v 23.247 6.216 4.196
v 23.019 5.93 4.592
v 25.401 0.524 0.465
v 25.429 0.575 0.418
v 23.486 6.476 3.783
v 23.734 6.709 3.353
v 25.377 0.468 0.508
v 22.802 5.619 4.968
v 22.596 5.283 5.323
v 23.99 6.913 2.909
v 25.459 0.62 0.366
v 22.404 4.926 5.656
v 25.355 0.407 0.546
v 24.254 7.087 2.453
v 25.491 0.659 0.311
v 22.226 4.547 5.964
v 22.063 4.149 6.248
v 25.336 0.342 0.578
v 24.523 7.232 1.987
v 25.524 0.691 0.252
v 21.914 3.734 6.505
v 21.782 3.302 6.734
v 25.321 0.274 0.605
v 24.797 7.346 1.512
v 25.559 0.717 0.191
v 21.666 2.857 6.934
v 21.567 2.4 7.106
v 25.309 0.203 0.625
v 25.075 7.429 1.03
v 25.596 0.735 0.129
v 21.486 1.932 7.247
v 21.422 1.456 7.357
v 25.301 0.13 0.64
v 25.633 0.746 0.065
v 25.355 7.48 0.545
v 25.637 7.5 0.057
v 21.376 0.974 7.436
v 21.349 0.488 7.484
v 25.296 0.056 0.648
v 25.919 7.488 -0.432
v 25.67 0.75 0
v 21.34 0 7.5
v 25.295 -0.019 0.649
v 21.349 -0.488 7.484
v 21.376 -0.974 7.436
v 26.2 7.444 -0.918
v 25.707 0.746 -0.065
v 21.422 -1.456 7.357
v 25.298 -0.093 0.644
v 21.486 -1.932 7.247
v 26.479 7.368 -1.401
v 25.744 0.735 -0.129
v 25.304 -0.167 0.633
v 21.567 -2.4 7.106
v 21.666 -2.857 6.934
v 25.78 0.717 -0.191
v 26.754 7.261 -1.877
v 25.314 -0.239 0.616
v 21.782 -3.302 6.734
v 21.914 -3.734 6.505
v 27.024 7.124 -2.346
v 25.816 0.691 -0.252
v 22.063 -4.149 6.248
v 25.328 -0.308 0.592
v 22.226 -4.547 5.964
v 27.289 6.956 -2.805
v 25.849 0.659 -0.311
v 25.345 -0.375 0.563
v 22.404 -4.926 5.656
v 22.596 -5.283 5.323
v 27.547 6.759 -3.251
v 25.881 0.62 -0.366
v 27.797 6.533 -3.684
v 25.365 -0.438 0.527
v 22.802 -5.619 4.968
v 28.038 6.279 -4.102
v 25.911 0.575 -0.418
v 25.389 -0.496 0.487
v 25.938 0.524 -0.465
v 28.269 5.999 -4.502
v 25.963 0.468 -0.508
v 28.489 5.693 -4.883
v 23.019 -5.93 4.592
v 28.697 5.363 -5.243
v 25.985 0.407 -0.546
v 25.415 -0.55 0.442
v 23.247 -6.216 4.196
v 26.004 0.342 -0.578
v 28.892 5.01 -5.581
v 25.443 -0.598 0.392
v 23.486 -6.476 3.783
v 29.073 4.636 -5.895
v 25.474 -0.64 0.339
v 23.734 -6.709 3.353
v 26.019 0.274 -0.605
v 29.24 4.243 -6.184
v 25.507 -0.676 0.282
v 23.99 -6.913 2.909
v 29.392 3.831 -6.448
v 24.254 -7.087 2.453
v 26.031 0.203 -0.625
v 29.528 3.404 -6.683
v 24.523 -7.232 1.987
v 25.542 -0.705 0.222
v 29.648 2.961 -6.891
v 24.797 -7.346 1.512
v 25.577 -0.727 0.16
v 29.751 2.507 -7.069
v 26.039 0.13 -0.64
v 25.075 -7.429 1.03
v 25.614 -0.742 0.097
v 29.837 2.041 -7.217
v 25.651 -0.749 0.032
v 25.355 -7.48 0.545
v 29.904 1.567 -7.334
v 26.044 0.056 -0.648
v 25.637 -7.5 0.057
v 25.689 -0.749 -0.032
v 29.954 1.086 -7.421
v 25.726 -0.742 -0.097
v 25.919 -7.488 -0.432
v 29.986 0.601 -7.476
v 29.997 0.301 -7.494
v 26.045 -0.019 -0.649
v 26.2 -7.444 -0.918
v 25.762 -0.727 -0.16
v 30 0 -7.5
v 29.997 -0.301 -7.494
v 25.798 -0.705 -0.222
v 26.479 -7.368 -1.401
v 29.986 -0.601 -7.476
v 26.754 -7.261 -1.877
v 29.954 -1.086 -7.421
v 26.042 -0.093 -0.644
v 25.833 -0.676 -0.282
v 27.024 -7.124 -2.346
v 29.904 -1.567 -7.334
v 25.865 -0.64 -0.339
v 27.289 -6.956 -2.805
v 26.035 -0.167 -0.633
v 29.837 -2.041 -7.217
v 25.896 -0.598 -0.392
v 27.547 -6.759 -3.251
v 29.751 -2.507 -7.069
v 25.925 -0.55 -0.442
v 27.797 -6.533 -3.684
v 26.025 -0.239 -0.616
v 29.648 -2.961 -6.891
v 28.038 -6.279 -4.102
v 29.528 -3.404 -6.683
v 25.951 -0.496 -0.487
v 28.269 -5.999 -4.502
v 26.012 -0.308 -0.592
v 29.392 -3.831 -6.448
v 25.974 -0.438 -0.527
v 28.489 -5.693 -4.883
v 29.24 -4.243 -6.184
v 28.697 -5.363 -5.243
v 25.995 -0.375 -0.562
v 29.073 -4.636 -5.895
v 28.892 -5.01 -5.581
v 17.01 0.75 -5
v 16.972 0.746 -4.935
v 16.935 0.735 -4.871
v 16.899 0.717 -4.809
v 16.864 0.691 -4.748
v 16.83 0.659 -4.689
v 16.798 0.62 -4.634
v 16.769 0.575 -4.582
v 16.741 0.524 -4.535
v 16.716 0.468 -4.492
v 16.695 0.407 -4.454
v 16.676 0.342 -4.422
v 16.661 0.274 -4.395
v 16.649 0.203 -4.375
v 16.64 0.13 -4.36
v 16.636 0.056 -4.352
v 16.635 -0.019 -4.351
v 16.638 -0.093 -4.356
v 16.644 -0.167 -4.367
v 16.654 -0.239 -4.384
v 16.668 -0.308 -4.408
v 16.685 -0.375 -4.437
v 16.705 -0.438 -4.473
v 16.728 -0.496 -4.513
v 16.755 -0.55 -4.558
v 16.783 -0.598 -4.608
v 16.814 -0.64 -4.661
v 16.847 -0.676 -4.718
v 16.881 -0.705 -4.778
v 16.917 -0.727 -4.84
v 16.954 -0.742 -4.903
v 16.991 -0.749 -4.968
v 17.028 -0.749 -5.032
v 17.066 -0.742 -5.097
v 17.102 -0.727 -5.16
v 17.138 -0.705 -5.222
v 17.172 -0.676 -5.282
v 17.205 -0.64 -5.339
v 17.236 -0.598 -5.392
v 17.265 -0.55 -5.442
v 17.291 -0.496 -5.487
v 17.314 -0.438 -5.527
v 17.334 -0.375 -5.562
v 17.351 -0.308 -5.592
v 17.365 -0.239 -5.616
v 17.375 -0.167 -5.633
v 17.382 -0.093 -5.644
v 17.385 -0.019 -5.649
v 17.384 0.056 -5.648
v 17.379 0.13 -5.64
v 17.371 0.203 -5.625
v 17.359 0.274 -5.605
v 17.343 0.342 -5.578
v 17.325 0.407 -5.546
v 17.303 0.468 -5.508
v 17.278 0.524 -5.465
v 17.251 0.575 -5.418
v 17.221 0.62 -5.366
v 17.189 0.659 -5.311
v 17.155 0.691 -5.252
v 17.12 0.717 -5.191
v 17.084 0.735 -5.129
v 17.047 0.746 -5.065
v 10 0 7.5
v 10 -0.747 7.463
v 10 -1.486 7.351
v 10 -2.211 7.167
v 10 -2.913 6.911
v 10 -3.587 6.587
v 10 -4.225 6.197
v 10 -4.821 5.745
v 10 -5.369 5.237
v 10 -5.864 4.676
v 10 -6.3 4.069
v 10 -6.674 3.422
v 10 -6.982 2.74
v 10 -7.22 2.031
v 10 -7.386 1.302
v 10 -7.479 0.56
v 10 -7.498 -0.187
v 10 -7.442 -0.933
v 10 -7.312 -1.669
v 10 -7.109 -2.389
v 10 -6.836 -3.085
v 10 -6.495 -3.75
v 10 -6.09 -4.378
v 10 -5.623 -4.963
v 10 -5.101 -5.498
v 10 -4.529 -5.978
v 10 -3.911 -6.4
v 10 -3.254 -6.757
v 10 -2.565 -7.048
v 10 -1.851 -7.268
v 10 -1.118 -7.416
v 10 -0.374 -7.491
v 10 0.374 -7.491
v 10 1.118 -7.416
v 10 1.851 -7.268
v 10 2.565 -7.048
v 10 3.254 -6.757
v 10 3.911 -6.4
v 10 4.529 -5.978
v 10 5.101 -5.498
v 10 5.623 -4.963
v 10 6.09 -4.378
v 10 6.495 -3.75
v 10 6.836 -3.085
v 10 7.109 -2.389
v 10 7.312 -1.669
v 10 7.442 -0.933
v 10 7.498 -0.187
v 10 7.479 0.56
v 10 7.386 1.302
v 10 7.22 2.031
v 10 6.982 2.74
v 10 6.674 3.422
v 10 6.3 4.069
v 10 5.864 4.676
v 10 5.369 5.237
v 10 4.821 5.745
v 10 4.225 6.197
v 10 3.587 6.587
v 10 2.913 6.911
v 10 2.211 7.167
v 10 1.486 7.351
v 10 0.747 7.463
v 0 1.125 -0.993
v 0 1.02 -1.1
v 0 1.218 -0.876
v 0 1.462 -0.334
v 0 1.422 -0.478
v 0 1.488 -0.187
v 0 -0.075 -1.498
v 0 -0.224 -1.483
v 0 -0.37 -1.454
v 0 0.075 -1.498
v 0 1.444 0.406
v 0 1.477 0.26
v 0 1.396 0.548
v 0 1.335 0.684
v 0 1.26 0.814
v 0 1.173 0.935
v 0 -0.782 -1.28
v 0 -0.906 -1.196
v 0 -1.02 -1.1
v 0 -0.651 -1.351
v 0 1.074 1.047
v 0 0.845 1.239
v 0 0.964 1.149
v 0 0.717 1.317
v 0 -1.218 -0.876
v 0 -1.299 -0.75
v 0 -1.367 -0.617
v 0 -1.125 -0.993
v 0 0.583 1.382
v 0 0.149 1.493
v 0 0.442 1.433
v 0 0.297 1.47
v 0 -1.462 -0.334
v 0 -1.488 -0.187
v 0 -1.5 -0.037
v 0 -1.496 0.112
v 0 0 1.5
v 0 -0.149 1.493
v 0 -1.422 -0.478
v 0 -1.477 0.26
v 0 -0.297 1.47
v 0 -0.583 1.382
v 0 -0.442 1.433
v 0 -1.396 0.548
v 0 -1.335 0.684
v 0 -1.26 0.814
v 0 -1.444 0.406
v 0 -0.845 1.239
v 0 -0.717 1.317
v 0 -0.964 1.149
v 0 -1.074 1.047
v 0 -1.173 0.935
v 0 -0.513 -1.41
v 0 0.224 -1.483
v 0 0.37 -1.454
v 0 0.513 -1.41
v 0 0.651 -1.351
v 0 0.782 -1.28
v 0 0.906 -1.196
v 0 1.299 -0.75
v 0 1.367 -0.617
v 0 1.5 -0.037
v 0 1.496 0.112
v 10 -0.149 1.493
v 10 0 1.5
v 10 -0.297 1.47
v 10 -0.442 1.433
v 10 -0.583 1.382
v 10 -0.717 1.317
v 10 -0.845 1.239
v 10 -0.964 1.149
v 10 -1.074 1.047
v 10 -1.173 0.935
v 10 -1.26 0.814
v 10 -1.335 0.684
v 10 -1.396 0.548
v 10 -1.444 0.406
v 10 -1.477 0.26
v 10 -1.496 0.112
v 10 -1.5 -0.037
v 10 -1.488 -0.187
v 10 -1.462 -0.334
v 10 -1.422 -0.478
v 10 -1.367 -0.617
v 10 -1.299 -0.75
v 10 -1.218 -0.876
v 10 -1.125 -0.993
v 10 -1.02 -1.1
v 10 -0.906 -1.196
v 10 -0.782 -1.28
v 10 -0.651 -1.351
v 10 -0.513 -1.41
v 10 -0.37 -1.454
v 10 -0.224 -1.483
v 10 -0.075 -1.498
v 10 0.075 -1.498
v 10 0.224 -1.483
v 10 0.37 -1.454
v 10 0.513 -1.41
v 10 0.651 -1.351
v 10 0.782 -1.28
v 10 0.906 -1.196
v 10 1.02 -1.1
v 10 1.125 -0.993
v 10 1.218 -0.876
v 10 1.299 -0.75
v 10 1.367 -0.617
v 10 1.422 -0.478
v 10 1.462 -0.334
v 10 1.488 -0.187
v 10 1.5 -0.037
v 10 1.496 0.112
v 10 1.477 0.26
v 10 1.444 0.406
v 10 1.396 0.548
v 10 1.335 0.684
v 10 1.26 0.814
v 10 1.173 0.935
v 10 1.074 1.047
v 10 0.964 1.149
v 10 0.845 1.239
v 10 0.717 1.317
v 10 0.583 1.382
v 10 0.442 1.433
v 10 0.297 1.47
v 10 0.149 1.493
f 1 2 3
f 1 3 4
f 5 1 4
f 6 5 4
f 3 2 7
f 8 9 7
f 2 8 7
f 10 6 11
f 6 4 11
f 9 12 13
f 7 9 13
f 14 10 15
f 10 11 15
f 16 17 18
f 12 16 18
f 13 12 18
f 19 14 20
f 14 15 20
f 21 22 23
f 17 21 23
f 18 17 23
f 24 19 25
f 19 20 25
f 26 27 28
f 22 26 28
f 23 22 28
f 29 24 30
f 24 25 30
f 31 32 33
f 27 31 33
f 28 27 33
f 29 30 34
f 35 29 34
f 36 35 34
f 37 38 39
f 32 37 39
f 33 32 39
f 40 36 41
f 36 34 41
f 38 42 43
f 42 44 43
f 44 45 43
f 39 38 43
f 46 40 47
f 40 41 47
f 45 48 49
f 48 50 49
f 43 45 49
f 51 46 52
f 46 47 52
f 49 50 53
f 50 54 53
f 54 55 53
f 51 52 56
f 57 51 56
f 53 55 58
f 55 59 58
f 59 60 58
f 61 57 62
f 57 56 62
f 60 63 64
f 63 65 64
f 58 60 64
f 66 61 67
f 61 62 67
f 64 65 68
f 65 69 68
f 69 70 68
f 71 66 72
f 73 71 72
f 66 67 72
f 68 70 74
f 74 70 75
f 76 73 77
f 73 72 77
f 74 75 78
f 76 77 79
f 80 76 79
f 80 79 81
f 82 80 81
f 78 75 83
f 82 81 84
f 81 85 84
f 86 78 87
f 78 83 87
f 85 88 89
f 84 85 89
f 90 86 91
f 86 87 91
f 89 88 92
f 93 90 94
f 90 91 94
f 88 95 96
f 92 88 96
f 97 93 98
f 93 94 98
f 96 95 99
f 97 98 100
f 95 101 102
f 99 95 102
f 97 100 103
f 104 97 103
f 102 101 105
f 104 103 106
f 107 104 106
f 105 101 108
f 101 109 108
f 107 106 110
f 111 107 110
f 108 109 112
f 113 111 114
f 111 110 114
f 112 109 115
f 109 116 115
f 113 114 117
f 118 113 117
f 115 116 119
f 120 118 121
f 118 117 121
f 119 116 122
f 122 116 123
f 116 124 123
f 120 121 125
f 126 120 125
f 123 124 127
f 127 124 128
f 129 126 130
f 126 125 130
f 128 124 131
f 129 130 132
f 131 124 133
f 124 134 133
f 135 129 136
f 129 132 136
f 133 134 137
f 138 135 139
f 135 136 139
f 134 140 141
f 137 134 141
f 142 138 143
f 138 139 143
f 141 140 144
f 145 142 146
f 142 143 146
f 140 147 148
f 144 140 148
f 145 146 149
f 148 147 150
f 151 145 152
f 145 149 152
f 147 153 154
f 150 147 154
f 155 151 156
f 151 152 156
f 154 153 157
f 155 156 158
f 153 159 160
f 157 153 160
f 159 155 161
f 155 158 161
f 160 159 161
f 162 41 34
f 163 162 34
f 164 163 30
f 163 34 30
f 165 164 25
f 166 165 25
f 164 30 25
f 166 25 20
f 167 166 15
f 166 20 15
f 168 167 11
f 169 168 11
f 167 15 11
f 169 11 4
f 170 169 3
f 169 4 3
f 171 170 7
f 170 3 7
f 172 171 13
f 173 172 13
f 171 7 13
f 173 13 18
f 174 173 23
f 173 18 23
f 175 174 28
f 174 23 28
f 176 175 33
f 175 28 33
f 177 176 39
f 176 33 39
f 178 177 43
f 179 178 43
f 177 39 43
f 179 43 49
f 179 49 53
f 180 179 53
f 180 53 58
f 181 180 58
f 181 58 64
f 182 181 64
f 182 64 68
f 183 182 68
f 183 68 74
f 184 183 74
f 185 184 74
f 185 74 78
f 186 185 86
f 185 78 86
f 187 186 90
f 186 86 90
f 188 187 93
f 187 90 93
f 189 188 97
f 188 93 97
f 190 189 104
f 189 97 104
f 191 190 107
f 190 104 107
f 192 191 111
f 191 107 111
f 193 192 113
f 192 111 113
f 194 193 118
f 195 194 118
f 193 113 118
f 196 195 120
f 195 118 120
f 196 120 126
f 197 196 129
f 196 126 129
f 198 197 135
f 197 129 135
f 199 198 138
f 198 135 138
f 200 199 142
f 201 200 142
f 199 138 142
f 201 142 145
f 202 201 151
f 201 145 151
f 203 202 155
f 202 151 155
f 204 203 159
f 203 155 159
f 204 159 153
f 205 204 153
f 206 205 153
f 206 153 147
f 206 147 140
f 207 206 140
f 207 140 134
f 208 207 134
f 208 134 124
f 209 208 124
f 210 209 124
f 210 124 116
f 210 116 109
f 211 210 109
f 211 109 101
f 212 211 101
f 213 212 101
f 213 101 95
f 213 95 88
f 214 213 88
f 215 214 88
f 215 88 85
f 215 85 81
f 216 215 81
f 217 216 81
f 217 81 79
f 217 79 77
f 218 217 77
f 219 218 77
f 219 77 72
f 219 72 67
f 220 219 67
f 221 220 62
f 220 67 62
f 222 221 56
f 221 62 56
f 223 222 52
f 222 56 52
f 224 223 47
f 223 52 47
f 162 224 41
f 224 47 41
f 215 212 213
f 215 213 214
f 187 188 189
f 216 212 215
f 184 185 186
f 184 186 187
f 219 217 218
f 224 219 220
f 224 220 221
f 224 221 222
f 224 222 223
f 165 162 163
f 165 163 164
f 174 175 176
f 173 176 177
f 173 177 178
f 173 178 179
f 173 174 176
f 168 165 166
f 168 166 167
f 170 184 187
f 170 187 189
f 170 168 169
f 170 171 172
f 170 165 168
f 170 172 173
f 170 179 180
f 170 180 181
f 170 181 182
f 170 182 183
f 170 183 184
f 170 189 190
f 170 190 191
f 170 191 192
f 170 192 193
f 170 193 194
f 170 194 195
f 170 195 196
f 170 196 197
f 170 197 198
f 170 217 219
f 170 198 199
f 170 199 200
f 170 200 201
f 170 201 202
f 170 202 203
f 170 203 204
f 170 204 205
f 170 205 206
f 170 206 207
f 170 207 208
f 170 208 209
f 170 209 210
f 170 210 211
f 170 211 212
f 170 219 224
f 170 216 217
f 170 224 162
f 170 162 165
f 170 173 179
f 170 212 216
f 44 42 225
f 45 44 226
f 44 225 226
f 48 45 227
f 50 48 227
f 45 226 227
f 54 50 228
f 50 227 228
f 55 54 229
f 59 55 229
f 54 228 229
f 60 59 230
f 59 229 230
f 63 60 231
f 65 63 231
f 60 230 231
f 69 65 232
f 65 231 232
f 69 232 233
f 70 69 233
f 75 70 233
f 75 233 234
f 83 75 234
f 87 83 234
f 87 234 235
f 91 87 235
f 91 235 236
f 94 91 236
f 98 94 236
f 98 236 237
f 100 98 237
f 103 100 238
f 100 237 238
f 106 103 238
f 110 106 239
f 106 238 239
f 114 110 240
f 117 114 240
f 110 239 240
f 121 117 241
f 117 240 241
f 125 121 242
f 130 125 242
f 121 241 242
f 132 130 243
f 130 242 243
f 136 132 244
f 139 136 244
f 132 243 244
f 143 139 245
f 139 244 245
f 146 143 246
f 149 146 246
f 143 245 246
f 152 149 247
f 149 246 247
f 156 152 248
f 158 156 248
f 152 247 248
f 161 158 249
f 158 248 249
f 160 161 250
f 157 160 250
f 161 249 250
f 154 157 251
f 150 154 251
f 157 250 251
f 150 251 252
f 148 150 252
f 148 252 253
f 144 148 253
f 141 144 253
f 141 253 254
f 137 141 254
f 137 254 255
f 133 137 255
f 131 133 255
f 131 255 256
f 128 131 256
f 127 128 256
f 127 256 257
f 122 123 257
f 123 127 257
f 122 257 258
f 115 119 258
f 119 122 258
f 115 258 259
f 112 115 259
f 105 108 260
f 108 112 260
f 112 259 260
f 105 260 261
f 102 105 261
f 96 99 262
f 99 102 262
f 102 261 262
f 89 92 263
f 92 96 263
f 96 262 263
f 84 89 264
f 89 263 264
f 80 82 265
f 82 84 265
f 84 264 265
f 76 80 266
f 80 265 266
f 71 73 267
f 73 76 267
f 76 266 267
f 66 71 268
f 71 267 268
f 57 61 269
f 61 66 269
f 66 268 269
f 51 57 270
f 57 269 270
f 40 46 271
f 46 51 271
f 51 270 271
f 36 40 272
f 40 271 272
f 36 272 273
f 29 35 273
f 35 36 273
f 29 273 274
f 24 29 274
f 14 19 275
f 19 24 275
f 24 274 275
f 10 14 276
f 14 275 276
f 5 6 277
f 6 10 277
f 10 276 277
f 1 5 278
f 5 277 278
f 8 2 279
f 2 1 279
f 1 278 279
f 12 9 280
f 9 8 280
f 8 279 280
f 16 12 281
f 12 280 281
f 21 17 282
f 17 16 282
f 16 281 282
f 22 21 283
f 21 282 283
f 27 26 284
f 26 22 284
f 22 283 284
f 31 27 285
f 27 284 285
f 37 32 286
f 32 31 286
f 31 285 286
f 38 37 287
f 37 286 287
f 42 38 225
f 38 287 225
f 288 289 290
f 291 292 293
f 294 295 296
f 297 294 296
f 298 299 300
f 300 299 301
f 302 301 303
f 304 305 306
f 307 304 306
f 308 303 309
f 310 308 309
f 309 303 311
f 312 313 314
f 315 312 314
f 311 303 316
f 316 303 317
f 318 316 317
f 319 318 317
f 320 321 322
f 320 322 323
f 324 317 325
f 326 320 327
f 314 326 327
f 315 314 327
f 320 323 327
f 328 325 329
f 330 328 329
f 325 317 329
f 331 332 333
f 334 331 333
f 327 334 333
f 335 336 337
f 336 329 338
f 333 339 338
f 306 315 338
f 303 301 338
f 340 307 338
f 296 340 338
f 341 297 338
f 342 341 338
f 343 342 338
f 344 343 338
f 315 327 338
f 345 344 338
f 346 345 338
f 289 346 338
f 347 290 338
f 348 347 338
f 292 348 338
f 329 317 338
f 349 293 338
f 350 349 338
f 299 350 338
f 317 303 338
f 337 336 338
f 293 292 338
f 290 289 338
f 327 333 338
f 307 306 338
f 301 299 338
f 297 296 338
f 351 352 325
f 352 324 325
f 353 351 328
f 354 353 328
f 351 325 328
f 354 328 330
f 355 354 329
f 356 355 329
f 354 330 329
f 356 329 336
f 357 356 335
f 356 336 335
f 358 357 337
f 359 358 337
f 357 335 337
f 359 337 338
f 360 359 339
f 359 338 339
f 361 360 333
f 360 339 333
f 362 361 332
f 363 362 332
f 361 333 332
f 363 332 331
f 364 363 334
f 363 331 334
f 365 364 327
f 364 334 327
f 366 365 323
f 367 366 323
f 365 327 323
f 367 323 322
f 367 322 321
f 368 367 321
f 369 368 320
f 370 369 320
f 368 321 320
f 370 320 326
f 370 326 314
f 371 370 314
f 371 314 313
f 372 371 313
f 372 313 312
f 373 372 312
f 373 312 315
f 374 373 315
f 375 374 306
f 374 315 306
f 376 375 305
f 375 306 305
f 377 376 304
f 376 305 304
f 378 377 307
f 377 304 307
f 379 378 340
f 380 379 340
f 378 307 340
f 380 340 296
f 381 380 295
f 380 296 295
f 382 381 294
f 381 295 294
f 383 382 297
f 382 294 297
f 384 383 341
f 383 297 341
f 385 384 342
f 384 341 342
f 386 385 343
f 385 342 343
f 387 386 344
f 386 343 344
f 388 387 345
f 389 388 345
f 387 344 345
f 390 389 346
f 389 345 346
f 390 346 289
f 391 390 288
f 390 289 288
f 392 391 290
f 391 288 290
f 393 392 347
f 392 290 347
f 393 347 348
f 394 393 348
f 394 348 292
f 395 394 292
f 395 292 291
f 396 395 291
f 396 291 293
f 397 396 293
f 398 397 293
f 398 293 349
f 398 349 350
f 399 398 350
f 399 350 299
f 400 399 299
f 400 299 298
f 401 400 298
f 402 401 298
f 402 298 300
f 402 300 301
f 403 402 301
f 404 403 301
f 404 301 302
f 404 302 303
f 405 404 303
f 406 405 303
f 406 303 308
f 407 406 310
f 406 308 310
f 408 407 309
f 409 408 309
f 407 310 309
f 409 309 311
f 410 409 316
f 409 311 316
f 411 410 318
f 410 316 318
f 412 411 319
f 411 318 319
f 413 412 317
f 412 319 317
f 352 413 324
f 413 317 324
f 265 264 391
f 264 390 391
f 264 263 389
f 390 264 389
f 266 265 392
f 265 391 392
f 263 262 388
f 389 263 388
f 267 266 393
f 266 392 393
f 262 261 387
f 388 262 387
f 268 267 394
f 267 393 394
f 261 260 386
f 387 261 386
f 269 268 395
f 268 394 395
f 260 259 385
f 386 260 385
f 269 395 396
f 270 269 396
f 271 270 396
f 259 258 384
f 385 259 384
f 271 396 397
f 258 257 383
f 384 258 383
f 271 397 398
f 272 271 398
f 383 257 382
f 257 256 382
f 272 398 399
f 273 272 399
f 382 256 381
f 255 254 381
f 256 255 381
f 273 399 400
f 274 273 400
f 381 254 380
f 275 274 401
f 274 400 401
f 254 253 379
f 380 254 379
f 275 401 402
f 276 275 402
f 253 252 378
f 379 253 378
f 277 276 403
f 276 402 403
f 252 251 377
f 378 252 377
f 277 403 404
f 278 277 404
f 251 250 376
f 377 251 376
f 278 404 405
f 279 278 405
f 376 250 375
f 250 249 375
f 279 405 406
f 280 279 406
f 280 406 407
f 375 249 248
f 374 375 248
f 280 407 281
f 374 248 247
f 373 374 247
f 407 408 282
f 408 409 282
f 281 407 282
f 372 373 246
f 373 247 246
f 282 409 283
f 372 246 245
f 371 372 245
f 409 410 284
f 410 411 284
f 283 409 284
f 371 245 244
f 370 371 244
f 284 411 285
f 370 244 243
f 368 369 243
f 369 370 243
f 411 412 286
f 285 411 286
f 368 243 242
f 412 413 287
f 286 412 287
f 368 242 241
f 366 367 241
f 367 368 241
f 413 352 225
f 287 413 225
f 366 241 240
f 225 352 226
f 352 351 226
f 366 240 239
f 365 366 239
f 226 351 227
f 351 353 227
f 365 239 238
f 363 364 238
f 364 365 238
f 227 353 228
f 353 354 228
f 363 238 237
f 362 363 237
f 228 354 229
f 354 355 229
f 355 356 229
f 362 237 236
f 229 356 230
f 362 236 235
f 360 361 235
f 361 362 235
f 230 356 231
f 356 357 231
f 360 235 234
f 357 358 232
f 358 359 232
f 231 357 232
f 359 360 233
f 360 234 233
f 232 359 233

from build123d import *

# Parameters (mm, degrees)
F3_DEPTH      = 7.501
F3_DEPTH_BACK = 7.501
F4_R          = 0.75
F5_DEPTH      = 10


with BuildPart() as f1:
    # F0 (on Front) → F1 (revolve)
    with BuildSketch(Plane.XZ):
        Polygon((30, 7.5), (10, 7.5), (10, 1.5), (0, 1.5), (0, 0), (30, 0), align=None)
    revolve(axis=Axis((8.7773360142, 0, 0), (1, 0, 0)))

    # F2 (on Front) → F3 (cut, two sides)
    with BuildSketch(Plane.XZ) as f3_sk:
        Polygon((21.3397459622, 7.5), (30, -7.5), (30, 7.5), align=None)
    extrude(amount=-F3_DEPTH, mode=Mode.SUBTRACT)
    extrude(f3_sk.sketch, amount=F3_DEPTH_BACK, mode=Mode.SUBTRACT)

    # F4 (on face) → F5 (cut)
    with BuildSketch(Plane(origin=(19.2524047358, 0, 11.1153810568), x_dir=(0, 1, 0), z_dir=(0.8660254038, 0, 0.5))):
        with Locations((0, -12.8349364905)):
            Circle(F4_R)
    extrude(amount=-F5_DEPTH, mode=Mode.SUBTRACT)


solid = f1.part
